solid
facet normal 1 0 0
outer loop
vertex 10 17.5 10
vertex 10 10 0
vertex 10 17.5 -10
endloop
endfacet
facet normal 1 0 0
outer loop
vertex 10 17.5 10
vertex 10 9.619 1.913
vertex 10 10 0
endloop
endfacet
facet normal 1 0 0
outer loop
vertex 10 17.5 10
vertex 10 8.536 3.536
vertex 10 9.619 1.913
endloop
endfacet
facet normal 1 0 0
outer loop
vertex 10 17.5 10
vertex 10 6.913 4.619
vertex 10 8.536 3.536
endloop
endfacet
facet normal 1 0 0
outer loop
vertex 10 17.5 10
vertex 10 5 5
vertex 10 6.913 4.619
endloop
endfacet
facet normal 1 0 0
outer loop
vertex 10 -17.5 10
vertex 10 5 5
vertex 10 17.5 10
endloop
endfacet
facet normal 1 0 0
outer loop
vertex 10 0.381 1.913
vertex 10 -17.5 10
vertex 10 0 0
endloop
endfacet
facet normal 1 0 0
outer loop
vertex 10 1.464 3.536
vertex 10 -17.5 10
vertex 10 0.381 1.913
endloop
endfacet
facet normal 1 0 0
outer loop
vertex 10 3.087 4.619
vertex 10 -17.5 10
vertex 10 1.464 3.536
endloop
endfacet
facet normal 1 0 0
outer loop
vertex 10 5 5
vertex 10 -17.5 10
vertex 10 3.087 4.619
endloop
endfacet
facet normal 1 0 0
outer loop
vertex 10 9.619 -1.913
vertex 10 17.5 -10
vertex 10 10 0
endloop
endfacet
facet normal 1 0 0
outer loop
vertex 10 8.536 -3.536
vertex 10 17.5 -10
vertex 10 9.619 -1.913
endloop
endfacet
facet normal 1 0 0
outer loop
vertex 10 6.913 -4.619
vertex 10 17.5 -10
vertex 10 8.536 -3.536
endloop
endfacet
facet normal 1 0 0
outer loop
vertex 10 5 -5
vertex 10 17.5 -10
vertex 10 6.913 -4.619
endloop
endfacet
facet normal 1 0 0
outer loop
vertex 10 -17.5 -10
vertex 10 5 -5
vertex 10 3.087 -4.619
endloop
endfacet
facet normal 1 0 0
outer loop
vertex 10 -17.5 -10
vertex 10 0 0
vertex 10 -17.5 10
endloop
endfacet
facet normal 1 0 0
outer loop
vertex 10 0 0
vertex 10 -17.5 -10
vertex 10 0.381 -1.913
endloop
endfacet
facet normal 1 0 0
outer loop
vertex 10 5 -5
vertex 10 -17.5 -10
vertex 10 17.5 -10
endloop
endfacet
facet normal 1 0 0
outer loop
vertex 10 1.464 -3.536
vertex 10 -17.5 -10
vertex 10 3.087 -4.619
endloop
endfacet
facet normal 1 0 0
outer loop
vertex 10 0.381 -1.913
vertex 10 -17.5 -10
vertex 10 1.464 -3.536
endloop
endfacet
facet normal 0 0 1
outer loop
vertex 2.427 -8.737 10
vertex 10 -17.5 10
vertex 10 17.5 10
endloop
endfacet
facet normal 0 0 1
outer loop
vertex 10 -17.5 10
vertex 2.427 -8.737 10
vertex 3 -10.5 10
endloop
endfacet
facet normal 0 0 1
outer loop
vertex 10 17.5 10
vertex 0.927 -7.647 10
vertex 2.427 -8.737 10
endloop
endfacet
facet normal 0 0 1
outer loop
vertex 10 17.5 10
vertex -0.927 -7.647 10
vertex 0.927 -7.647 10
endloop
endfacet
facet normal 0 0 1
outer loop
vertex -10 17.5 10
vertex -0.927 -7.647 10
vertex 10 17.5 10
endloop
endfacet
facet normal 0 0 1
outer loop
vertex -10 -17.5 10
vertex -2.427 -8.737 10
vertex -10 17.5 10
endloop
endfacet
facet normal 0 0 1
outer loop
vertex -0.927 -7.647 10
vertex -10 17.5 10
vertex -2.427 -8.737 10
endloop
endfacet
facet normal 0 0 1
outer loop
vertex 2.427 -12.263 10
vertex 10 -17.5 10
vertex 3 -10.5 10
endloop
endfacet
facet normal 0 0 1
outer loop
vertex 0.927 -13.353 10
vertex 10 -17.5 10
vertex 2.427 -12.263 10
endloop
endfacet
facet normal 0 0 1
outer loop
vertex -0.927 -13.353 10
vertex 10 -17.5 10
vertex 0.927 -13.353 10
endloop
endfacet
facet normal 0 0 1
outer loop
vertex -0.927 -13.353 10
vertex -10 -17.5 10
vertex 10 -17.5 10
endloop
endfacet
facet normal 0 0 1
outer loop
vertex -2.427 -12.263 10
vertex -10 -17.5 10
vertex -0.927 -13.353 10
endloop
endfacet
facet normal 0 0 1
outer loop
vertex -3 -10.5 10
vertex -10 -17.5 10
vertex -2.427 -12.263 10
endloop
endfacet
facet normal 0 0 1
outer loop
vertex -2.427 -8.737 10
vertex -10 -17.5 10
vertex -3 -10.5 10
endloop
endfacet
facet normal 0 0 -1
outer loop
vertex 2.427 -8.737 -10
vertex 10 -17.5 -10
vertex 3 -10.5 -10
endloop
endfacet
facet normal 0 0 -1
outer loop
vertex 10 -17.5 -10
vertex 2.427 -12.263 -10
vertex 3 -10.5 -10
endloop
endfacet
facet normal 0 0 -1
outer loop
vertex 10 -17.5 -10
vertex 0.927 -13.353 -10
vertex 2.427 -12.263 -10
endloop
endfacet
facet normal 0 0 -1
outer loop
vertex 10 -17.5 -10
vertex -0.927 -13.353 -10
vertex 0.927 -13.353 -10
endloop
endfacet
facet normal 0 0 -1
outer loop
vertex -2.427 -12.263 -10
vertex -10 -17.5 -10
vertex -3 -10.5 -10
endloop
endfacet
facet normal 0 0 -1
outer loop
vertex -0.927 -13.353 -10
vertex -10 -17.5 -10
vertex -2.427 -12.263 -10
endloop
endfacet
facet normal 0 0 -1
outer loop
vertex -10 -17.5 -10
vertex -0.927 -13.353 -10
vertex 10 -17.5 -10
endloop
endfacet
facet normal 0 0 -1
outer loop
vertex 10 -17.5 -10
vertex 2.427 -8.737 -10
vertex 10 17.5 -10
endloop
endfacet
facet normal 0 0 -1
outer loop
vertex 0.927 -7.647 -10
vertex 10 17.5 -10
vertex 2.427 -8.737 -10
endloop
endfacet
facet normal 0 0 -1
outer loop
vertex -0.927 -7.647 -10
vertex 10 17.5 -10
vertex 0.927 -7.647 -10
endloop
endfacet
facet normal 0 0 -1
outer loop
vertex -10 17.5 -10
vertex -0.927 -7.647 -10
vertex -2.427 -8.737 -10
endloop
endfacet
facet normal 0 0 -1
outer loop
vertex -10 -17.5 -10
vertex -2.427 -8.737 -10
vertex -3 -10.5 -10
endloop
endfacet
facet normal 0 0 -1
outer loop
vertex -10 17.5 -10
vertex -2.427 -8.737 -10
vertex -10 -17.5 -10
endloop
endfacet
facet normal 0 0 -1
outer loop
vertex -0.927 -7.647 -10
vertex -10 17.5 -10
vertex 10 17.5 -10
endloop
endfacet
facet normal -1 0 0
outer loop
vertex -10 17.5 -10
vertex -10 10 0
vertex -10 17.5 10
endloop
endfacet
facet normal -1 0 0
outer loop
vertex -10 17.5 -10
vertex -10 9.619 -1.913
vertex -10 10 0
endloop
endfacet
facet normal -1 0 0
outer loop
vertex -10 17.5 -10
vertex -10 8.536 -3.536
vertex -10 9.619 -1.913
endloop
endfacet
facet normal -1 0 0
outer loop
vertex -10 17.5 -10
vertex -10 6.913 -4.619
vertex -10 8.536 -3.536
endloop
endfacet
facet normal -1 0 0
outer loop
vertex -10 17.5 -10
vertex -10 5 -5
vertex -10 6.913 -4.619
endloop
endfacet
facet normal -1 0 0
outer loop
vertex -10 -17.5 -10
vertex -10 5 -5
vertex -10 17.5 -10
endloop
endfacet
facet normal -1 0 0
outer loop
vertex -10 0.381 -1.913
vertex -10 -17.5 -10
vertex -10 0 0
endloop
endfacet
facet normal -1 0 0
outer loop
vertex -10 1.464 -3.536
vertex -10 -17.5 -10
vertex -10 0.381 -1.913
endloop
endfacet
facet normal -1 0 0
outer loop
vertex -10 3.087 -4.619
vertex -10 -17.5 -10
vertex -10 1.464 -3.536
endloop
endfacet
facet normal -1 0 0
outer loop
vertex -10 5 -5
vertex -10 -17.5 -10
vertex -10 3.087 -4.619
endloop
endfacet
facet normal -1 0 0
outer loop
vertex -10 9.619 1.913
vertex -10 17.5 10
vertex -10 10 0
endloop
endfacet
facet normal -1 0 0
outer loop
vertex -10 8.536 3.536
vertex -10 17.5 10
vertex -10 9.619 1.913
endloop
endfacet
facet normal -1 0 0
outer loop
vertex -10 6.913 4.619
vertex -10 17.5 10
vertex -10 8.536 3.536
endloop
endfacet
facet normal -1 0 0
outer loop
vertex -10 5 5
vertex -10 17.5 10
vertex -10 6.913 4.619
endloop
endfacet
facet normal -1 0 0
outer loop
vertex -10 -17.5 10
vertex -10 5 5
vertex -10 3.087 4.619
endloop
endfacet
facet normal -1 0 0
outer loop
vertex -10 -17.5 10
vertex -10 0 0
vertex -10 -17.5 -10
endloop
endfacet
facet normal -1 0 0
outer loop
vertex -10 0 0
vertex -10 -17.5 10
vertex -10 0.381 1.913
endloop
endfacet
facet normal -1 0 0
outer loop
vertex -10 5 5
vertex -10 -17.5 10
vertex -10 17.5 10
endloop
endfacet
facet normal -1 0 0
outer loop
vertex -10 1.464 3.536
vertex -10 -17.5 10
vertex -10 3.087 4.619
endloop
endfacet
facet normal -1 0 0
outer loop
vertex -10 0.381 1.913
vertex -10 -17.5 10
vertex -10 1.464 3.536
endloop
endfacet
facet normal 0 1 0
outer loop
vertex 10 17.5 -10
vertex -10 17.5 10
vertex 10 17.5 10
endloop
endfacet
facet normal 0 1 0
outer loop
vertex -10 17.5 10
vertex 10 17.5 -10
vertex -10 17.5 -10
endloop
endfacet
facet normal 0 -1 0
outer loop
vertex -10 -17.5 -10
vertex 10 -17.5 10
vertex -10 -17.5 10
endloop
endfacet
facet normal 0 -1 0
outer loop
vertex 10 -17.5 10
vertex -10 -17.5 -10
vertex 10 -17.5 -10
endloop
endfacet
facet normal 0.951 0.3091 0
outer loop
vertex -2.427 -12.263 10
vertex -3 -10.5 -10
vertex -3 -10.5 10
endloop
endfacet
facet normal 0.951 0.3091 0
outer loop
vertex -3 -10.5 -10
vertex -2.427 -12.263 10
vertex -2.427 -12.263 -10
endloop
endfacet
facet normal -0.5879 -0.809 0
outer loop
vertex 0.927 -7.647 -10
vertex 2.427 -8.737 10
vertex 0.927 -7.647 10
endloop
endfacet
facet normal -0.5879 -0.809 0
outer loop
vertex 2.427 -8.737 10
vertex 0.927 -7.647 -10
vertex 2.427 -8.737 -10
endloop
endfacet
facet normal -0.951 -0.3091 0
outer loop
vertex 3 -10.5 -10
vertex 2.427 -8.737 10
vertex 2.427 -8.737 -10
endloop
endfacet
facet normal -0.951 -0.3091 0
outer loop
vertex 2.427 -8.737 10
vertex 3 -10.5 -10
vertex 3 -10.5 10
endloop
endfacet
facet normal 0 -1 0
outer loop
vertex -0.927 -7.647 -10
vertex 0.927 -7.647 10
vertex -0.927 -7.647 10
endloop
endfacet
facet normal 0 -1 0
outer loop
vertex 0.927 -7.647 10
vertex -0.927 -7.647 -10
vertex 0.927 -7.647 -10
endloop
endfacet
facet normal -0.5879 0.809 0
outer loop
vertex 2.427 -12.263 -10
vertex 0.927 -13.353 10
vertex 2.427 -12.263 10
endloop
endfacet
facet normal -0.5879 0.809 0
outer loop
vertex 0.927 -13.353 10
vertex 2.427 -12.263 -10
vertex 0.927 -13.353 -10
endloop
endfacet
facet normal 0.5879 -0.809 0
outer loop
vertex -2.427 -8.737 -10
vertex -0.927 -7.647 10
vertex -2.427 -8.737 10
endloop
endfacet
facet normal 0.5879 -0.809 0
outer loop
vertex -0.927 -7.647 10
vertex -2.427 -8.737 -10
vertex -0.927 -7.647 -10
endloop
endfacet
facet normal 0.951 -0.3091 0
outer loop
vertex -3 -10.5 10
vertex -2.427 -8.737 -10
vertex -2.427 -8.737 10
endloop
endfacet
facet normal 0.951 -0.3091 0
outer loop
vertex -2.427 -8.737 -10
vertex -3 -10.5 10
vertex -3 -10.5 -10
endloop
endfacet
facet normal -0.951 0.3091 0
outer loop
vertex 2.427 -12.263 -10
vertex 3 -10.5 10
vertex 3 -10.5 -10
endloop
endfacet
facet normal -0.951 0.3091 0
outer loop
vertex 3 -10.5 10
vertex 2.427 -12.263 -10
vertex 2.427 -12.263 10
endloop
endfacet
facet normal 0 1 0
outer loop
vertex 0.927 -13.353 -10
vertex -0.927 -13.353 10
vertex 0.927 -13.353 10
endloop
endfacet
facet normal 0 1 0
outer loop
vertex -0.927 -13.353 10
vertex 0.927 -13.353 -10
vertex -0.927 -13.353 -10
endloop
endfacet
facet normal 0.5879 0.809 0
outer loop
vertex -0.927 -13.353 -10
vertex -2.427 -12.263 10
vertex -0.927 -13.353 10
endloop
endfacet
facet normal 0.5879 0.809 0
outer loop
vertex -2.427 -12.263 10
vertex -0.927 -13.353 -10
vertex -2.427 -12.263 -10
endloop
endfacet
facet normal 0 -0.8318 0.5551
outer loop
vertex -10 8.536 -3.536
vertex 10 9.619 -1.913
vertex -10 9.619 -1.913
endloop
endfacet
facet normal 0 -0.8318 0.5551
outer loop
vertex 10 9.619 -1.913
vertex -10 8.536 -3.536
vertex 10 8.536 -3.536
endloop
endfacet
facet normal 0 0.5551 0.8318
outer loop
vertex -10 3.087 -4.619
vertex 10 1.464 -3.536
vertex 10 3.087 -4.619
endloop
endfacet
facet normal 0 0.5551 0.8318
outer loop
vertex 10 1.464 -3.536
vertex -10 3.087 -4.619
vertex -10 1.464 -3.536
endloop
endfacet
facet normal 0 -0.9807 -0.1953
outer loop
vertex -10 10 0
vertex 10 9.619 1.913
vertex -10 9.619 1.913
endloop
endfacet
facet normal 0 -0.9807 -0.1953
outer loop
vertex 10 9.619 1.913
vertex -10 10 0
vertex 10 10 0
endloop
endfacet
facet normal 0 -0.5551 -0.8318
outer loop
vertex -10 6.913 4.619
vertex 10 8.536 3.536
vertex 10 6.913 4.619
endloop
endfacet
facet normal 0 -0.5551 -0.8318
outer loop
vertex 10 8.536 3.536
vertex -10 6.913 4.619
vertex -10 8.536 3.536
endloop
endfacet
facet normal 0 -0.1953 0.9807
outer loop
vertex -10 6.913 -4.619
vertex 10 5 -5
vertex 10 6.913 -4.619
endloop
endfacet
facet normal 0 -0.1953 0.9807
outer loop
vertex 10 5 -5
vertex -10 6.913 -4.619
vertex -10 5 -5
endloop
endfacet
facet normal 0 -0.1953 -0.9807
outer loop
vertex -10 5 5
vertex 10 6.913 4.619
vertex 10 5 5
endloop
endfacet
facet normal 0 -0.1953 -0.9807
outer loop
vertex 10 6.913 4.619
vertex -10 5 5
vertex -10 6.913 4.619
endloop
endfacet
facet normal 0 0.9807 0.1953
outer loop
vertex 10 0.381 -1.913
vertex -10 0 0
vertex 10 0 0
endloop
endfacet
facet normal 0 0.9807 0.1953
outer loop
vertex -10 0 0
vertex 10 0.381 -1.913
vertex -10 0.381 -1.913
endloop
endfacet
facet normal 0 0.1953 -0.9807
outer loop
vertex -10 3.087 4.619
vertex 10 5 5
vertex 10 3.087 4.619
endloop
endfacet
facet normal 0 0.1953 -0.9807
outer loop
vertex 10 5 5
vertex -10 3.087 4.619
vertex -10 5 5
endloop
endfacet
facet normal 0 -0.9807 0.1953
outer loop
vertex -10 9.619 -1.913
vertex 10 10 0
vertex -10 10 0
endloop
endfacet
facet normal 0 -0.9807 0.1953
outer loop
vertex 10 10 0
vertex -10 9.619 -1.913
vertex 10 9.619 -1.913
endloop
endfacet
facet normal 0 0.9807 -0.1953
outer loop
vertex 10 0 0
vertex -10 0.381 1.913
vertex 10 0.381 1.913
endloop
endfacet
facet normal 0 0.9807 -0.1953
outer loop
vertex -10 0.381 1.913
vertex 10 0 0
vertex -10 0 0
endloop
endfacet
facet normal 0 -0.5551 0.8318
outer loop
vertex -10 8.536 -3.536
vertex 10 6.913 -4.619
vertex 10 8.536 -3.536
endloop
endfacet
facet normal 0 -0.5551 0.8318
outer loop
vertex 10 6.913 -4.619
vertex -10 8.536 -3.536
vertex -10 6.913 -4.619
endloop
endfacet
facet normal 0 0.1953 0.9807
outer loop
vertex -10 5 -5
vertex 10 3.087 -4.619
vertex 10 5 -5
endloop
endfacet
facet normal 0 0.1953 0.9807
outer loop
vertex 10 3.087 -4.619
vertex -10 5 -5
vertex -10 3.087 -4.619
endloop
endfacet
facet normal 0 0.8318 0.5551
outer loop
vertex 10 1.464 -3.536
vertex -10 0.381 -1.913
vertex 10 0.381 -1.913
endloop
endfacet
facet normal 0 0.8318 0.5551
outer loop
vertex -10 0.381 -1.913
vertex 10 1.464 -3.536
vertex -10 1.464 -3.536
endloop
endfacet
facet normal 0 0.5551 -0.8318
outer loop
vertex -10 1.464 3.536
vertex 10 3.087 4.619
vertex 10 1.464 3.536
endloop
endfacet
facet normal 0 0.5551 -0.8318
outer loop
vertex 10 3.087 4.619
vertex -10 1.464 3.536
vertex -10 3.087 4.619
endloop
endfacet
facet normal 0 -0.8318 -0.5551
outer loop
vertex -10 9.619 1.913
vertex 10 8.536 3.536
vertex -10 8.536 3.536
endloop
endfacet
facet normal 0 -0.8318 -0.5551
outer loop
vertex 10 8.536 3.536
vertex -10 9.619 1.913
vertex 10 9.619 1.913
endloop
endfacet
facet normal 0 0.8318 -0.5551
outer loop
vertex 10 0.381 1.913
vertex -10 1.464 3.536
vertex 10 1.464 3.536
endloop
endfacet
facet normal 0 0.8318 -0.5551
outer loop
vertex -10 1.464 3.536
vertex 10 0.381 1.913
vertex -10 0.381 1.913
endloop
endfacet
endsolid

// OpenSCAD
// Universal Quadpod end part of the arm 
cube_width=20;
cube_lenght=35;
cube_height=20;
screw_dia=6;
hole_dia=10;
difference(){
    cube([cube_width,cube_lenght,cube_height], center=true); 
    translate([0,-cube_lenght/2+7,0])cylinder(h = cube_height+2 , d = screw_dia, center=true); 
    rotate([0,90,0])translate([0,hole_dia/2,0])cylinder(h = cube_width+2 , d = hole_dia, center=true);
}
